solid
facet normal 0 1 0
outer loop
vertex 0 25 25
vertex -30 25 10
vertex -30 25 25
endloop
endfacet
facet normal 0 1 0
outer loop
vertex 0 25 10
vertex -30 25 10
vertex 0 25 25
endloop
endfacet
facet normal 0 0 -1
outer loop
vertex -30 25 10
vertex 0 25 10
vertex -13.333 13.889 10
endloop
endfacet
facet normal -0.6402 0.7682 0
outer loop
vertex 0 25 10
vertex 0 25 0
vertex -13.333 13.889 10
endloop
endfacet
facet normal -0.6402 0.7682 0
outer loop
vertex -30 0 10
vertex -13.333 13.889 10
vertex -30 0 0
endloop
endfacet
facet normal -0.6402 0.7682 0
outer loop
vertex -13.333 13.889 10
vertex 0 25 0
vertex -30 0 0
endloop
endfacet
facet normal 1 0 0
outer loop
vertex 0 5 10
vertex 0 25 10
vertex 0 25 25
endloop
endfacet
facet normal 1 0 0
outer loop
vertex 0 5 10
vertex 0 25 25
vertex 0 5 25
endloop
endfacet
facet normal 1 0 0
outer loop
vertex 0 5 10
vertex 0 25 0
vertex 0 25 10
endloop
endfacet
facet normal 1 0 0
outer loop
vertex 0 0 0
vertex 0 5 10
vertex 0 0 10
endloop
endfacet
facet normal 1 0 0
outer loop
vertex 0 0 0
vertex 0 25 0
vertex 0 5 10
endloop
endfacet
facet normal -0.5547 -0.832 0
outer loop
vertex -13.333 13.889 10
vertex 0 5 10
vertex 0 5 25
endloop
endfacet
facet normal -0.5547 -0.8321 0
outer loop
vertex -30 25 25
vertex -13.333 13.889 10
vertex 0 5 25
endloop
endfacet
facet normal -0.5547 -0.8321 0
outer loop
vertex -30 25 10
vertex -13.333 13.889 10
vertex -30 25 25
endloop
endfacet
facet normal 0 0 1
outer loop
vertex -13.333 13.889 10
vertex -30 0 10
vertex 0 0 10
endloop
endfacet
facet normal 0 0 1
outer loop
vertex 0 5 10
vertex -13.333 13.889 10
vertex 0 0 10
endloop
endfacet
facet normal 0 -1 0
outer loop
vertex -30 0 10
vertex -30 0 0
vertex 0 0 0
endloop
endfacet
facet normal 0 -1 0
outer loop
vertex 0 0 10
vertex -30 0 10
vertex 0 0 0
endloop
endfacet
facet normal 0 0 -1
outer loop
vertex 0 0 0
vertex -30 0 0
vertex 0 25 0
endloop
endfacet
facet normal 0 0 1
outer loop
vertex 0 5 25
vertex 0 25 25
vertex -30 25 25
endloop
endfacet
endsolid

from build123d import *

# Parameters (mm, degrees)
BOSS_EXTRUDE1_DEPTH = 10
BOSS_EXTRUDE2_DEPTH = 15


with BuildPart() as part:
    # Sketch1 → Boss-Extrude1 (new body)
    with BuildSketch(Plane.XY):
        Polygon((0, 0), (0, 25), (-30, 0), align=None)
    extrude(amount=BOSS_EXTRUDE1_DEPTH)

    # Sketch2 → Boss-Extrude2 (add)
    with BuildSketch(Plane.XY.offset(10)):
        Polygon((-30, 25), (0, 25), (0, 5), align=None)
    extrude(amount=BOSS_EXTRUDE2_DEPTH)


solid = part.part
